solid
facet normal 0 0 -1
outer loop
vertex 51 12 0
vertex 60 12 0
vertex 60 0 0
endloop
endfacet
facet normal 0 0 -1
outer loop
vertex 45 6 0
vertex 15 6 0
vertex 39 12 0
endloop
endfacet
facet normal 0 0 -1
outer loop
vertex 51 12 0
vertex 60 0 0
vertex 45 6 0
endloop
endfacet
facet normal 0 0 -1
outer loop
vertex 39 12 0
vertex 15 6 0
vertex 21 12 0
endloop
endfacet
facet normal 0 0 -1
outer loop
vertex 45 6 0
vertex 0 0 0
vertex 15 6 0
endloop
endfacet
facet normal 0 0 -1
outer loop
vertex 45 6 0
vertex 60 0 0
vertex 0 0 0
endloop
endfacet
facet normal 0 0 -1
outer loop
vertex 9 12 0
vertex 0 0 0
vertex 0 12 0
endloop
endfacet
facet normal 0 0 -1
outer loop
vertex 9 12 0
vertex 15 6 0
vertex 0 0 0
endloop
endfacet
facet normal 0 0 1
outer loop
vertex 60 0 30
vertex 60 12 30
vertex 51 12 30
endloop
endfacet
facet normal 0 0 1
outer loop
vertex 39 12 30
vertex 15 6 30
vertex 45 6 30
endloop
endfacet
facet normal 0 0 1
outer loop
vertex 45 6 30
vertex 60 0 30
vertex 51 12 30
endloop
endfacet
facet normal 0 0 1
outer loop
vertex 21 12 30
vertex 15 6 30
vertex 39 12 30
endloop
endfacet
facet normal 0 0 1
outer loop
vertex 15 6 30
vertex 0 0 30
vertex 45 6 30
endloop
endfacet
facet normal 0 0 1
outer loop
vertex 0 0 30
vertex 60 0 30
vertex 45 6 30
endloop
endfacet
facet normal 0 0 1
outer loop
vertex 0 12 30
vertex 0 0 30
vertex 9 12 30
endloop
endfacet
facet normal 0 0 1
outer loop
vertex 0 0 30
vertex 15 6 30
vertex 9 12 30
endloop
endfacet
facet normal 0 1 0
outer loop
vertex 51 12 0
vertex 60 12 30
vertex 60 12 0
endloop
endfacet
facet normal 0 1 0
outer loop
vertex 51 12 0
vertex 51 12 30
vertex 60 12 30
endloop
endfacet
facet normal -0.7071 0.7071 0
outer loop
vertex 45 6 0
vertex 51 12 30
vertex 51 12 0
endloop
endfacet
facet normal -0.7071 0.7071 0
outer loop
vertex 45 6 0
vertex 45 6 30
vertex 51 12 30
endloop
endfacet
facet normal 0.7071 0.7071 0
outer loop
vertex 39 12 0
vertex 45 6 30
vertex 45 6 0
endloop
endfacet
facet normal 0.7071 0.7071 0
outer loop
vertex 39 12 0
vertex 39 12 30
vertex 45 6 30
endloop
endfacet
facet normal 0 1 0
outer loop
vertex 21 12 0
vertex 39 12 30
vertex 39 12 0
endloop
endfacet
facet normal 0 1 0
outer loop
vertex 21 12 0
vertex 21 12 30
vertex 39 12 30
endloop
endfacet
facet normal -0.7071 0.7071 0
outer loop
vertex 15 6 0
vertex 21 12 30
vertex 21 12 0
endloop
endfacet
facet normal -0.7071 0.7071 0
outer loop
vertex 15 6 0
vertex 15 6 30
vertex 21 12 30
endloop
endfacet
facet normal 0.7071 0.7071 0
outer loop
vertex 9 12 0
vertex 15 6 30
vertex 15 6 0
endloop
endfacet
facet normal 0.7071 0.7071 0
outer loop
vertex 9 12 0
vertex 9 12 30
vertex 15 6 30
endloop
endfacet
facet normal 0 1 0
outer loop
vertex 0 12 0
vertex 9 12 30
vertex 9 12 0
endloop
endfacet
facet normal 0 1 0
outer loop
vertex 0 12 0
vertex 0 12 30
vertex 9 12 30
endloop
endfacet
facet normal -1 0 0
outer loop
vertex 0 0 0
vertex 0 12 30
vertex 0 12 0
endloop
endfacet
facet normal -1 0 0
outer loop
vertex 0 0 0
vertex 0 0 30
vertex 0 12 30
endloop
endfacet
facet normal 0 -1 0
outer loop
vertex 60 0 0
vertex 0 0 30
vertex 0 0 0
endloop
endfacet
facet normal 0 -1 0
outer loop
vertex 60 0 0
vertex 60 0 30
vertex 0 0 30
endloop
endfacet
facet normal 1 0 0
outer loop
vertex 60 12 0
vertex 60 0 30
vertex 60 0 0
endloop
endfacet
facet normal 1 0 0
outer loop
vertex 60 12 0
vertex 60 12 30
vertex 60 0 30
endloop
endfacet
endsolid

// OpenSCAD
$fn = 32;

// ----------------------------------------------------------------------
// V guide rail: doublev, 60 mm wide
// ----------------------------------------------------------------------

// --- parameters (mm) ---
rail_w = 60;              // rail width, X
base_t = 12;              // base plate thickness
v_depth = 6;              // V feature depth / height
v_half_w = 12;            // half width of the V at the base face
plate_t = 30;             // rail length, Z (the extrusion height)
groove_off = 15;          // offset of each groove from the centreline

centre_x = rail_w / 2;  // rail centreline
groove_a = centre_x - groove_off;  // axis of the first groove
groove_b = centre_x + groove_off;  // axis of the second groove

profile = [[0, 0], [60, 0], [60, 12], [51, 12], [45, 6], [39, 12], [21, 12], [15, 6], [9, 12], [0, 12]];  // primary outline, 10 points, counter clockwise

// --- the one profile operation ---
linear_extrude(height = plate_t) polygon(points = profile);
